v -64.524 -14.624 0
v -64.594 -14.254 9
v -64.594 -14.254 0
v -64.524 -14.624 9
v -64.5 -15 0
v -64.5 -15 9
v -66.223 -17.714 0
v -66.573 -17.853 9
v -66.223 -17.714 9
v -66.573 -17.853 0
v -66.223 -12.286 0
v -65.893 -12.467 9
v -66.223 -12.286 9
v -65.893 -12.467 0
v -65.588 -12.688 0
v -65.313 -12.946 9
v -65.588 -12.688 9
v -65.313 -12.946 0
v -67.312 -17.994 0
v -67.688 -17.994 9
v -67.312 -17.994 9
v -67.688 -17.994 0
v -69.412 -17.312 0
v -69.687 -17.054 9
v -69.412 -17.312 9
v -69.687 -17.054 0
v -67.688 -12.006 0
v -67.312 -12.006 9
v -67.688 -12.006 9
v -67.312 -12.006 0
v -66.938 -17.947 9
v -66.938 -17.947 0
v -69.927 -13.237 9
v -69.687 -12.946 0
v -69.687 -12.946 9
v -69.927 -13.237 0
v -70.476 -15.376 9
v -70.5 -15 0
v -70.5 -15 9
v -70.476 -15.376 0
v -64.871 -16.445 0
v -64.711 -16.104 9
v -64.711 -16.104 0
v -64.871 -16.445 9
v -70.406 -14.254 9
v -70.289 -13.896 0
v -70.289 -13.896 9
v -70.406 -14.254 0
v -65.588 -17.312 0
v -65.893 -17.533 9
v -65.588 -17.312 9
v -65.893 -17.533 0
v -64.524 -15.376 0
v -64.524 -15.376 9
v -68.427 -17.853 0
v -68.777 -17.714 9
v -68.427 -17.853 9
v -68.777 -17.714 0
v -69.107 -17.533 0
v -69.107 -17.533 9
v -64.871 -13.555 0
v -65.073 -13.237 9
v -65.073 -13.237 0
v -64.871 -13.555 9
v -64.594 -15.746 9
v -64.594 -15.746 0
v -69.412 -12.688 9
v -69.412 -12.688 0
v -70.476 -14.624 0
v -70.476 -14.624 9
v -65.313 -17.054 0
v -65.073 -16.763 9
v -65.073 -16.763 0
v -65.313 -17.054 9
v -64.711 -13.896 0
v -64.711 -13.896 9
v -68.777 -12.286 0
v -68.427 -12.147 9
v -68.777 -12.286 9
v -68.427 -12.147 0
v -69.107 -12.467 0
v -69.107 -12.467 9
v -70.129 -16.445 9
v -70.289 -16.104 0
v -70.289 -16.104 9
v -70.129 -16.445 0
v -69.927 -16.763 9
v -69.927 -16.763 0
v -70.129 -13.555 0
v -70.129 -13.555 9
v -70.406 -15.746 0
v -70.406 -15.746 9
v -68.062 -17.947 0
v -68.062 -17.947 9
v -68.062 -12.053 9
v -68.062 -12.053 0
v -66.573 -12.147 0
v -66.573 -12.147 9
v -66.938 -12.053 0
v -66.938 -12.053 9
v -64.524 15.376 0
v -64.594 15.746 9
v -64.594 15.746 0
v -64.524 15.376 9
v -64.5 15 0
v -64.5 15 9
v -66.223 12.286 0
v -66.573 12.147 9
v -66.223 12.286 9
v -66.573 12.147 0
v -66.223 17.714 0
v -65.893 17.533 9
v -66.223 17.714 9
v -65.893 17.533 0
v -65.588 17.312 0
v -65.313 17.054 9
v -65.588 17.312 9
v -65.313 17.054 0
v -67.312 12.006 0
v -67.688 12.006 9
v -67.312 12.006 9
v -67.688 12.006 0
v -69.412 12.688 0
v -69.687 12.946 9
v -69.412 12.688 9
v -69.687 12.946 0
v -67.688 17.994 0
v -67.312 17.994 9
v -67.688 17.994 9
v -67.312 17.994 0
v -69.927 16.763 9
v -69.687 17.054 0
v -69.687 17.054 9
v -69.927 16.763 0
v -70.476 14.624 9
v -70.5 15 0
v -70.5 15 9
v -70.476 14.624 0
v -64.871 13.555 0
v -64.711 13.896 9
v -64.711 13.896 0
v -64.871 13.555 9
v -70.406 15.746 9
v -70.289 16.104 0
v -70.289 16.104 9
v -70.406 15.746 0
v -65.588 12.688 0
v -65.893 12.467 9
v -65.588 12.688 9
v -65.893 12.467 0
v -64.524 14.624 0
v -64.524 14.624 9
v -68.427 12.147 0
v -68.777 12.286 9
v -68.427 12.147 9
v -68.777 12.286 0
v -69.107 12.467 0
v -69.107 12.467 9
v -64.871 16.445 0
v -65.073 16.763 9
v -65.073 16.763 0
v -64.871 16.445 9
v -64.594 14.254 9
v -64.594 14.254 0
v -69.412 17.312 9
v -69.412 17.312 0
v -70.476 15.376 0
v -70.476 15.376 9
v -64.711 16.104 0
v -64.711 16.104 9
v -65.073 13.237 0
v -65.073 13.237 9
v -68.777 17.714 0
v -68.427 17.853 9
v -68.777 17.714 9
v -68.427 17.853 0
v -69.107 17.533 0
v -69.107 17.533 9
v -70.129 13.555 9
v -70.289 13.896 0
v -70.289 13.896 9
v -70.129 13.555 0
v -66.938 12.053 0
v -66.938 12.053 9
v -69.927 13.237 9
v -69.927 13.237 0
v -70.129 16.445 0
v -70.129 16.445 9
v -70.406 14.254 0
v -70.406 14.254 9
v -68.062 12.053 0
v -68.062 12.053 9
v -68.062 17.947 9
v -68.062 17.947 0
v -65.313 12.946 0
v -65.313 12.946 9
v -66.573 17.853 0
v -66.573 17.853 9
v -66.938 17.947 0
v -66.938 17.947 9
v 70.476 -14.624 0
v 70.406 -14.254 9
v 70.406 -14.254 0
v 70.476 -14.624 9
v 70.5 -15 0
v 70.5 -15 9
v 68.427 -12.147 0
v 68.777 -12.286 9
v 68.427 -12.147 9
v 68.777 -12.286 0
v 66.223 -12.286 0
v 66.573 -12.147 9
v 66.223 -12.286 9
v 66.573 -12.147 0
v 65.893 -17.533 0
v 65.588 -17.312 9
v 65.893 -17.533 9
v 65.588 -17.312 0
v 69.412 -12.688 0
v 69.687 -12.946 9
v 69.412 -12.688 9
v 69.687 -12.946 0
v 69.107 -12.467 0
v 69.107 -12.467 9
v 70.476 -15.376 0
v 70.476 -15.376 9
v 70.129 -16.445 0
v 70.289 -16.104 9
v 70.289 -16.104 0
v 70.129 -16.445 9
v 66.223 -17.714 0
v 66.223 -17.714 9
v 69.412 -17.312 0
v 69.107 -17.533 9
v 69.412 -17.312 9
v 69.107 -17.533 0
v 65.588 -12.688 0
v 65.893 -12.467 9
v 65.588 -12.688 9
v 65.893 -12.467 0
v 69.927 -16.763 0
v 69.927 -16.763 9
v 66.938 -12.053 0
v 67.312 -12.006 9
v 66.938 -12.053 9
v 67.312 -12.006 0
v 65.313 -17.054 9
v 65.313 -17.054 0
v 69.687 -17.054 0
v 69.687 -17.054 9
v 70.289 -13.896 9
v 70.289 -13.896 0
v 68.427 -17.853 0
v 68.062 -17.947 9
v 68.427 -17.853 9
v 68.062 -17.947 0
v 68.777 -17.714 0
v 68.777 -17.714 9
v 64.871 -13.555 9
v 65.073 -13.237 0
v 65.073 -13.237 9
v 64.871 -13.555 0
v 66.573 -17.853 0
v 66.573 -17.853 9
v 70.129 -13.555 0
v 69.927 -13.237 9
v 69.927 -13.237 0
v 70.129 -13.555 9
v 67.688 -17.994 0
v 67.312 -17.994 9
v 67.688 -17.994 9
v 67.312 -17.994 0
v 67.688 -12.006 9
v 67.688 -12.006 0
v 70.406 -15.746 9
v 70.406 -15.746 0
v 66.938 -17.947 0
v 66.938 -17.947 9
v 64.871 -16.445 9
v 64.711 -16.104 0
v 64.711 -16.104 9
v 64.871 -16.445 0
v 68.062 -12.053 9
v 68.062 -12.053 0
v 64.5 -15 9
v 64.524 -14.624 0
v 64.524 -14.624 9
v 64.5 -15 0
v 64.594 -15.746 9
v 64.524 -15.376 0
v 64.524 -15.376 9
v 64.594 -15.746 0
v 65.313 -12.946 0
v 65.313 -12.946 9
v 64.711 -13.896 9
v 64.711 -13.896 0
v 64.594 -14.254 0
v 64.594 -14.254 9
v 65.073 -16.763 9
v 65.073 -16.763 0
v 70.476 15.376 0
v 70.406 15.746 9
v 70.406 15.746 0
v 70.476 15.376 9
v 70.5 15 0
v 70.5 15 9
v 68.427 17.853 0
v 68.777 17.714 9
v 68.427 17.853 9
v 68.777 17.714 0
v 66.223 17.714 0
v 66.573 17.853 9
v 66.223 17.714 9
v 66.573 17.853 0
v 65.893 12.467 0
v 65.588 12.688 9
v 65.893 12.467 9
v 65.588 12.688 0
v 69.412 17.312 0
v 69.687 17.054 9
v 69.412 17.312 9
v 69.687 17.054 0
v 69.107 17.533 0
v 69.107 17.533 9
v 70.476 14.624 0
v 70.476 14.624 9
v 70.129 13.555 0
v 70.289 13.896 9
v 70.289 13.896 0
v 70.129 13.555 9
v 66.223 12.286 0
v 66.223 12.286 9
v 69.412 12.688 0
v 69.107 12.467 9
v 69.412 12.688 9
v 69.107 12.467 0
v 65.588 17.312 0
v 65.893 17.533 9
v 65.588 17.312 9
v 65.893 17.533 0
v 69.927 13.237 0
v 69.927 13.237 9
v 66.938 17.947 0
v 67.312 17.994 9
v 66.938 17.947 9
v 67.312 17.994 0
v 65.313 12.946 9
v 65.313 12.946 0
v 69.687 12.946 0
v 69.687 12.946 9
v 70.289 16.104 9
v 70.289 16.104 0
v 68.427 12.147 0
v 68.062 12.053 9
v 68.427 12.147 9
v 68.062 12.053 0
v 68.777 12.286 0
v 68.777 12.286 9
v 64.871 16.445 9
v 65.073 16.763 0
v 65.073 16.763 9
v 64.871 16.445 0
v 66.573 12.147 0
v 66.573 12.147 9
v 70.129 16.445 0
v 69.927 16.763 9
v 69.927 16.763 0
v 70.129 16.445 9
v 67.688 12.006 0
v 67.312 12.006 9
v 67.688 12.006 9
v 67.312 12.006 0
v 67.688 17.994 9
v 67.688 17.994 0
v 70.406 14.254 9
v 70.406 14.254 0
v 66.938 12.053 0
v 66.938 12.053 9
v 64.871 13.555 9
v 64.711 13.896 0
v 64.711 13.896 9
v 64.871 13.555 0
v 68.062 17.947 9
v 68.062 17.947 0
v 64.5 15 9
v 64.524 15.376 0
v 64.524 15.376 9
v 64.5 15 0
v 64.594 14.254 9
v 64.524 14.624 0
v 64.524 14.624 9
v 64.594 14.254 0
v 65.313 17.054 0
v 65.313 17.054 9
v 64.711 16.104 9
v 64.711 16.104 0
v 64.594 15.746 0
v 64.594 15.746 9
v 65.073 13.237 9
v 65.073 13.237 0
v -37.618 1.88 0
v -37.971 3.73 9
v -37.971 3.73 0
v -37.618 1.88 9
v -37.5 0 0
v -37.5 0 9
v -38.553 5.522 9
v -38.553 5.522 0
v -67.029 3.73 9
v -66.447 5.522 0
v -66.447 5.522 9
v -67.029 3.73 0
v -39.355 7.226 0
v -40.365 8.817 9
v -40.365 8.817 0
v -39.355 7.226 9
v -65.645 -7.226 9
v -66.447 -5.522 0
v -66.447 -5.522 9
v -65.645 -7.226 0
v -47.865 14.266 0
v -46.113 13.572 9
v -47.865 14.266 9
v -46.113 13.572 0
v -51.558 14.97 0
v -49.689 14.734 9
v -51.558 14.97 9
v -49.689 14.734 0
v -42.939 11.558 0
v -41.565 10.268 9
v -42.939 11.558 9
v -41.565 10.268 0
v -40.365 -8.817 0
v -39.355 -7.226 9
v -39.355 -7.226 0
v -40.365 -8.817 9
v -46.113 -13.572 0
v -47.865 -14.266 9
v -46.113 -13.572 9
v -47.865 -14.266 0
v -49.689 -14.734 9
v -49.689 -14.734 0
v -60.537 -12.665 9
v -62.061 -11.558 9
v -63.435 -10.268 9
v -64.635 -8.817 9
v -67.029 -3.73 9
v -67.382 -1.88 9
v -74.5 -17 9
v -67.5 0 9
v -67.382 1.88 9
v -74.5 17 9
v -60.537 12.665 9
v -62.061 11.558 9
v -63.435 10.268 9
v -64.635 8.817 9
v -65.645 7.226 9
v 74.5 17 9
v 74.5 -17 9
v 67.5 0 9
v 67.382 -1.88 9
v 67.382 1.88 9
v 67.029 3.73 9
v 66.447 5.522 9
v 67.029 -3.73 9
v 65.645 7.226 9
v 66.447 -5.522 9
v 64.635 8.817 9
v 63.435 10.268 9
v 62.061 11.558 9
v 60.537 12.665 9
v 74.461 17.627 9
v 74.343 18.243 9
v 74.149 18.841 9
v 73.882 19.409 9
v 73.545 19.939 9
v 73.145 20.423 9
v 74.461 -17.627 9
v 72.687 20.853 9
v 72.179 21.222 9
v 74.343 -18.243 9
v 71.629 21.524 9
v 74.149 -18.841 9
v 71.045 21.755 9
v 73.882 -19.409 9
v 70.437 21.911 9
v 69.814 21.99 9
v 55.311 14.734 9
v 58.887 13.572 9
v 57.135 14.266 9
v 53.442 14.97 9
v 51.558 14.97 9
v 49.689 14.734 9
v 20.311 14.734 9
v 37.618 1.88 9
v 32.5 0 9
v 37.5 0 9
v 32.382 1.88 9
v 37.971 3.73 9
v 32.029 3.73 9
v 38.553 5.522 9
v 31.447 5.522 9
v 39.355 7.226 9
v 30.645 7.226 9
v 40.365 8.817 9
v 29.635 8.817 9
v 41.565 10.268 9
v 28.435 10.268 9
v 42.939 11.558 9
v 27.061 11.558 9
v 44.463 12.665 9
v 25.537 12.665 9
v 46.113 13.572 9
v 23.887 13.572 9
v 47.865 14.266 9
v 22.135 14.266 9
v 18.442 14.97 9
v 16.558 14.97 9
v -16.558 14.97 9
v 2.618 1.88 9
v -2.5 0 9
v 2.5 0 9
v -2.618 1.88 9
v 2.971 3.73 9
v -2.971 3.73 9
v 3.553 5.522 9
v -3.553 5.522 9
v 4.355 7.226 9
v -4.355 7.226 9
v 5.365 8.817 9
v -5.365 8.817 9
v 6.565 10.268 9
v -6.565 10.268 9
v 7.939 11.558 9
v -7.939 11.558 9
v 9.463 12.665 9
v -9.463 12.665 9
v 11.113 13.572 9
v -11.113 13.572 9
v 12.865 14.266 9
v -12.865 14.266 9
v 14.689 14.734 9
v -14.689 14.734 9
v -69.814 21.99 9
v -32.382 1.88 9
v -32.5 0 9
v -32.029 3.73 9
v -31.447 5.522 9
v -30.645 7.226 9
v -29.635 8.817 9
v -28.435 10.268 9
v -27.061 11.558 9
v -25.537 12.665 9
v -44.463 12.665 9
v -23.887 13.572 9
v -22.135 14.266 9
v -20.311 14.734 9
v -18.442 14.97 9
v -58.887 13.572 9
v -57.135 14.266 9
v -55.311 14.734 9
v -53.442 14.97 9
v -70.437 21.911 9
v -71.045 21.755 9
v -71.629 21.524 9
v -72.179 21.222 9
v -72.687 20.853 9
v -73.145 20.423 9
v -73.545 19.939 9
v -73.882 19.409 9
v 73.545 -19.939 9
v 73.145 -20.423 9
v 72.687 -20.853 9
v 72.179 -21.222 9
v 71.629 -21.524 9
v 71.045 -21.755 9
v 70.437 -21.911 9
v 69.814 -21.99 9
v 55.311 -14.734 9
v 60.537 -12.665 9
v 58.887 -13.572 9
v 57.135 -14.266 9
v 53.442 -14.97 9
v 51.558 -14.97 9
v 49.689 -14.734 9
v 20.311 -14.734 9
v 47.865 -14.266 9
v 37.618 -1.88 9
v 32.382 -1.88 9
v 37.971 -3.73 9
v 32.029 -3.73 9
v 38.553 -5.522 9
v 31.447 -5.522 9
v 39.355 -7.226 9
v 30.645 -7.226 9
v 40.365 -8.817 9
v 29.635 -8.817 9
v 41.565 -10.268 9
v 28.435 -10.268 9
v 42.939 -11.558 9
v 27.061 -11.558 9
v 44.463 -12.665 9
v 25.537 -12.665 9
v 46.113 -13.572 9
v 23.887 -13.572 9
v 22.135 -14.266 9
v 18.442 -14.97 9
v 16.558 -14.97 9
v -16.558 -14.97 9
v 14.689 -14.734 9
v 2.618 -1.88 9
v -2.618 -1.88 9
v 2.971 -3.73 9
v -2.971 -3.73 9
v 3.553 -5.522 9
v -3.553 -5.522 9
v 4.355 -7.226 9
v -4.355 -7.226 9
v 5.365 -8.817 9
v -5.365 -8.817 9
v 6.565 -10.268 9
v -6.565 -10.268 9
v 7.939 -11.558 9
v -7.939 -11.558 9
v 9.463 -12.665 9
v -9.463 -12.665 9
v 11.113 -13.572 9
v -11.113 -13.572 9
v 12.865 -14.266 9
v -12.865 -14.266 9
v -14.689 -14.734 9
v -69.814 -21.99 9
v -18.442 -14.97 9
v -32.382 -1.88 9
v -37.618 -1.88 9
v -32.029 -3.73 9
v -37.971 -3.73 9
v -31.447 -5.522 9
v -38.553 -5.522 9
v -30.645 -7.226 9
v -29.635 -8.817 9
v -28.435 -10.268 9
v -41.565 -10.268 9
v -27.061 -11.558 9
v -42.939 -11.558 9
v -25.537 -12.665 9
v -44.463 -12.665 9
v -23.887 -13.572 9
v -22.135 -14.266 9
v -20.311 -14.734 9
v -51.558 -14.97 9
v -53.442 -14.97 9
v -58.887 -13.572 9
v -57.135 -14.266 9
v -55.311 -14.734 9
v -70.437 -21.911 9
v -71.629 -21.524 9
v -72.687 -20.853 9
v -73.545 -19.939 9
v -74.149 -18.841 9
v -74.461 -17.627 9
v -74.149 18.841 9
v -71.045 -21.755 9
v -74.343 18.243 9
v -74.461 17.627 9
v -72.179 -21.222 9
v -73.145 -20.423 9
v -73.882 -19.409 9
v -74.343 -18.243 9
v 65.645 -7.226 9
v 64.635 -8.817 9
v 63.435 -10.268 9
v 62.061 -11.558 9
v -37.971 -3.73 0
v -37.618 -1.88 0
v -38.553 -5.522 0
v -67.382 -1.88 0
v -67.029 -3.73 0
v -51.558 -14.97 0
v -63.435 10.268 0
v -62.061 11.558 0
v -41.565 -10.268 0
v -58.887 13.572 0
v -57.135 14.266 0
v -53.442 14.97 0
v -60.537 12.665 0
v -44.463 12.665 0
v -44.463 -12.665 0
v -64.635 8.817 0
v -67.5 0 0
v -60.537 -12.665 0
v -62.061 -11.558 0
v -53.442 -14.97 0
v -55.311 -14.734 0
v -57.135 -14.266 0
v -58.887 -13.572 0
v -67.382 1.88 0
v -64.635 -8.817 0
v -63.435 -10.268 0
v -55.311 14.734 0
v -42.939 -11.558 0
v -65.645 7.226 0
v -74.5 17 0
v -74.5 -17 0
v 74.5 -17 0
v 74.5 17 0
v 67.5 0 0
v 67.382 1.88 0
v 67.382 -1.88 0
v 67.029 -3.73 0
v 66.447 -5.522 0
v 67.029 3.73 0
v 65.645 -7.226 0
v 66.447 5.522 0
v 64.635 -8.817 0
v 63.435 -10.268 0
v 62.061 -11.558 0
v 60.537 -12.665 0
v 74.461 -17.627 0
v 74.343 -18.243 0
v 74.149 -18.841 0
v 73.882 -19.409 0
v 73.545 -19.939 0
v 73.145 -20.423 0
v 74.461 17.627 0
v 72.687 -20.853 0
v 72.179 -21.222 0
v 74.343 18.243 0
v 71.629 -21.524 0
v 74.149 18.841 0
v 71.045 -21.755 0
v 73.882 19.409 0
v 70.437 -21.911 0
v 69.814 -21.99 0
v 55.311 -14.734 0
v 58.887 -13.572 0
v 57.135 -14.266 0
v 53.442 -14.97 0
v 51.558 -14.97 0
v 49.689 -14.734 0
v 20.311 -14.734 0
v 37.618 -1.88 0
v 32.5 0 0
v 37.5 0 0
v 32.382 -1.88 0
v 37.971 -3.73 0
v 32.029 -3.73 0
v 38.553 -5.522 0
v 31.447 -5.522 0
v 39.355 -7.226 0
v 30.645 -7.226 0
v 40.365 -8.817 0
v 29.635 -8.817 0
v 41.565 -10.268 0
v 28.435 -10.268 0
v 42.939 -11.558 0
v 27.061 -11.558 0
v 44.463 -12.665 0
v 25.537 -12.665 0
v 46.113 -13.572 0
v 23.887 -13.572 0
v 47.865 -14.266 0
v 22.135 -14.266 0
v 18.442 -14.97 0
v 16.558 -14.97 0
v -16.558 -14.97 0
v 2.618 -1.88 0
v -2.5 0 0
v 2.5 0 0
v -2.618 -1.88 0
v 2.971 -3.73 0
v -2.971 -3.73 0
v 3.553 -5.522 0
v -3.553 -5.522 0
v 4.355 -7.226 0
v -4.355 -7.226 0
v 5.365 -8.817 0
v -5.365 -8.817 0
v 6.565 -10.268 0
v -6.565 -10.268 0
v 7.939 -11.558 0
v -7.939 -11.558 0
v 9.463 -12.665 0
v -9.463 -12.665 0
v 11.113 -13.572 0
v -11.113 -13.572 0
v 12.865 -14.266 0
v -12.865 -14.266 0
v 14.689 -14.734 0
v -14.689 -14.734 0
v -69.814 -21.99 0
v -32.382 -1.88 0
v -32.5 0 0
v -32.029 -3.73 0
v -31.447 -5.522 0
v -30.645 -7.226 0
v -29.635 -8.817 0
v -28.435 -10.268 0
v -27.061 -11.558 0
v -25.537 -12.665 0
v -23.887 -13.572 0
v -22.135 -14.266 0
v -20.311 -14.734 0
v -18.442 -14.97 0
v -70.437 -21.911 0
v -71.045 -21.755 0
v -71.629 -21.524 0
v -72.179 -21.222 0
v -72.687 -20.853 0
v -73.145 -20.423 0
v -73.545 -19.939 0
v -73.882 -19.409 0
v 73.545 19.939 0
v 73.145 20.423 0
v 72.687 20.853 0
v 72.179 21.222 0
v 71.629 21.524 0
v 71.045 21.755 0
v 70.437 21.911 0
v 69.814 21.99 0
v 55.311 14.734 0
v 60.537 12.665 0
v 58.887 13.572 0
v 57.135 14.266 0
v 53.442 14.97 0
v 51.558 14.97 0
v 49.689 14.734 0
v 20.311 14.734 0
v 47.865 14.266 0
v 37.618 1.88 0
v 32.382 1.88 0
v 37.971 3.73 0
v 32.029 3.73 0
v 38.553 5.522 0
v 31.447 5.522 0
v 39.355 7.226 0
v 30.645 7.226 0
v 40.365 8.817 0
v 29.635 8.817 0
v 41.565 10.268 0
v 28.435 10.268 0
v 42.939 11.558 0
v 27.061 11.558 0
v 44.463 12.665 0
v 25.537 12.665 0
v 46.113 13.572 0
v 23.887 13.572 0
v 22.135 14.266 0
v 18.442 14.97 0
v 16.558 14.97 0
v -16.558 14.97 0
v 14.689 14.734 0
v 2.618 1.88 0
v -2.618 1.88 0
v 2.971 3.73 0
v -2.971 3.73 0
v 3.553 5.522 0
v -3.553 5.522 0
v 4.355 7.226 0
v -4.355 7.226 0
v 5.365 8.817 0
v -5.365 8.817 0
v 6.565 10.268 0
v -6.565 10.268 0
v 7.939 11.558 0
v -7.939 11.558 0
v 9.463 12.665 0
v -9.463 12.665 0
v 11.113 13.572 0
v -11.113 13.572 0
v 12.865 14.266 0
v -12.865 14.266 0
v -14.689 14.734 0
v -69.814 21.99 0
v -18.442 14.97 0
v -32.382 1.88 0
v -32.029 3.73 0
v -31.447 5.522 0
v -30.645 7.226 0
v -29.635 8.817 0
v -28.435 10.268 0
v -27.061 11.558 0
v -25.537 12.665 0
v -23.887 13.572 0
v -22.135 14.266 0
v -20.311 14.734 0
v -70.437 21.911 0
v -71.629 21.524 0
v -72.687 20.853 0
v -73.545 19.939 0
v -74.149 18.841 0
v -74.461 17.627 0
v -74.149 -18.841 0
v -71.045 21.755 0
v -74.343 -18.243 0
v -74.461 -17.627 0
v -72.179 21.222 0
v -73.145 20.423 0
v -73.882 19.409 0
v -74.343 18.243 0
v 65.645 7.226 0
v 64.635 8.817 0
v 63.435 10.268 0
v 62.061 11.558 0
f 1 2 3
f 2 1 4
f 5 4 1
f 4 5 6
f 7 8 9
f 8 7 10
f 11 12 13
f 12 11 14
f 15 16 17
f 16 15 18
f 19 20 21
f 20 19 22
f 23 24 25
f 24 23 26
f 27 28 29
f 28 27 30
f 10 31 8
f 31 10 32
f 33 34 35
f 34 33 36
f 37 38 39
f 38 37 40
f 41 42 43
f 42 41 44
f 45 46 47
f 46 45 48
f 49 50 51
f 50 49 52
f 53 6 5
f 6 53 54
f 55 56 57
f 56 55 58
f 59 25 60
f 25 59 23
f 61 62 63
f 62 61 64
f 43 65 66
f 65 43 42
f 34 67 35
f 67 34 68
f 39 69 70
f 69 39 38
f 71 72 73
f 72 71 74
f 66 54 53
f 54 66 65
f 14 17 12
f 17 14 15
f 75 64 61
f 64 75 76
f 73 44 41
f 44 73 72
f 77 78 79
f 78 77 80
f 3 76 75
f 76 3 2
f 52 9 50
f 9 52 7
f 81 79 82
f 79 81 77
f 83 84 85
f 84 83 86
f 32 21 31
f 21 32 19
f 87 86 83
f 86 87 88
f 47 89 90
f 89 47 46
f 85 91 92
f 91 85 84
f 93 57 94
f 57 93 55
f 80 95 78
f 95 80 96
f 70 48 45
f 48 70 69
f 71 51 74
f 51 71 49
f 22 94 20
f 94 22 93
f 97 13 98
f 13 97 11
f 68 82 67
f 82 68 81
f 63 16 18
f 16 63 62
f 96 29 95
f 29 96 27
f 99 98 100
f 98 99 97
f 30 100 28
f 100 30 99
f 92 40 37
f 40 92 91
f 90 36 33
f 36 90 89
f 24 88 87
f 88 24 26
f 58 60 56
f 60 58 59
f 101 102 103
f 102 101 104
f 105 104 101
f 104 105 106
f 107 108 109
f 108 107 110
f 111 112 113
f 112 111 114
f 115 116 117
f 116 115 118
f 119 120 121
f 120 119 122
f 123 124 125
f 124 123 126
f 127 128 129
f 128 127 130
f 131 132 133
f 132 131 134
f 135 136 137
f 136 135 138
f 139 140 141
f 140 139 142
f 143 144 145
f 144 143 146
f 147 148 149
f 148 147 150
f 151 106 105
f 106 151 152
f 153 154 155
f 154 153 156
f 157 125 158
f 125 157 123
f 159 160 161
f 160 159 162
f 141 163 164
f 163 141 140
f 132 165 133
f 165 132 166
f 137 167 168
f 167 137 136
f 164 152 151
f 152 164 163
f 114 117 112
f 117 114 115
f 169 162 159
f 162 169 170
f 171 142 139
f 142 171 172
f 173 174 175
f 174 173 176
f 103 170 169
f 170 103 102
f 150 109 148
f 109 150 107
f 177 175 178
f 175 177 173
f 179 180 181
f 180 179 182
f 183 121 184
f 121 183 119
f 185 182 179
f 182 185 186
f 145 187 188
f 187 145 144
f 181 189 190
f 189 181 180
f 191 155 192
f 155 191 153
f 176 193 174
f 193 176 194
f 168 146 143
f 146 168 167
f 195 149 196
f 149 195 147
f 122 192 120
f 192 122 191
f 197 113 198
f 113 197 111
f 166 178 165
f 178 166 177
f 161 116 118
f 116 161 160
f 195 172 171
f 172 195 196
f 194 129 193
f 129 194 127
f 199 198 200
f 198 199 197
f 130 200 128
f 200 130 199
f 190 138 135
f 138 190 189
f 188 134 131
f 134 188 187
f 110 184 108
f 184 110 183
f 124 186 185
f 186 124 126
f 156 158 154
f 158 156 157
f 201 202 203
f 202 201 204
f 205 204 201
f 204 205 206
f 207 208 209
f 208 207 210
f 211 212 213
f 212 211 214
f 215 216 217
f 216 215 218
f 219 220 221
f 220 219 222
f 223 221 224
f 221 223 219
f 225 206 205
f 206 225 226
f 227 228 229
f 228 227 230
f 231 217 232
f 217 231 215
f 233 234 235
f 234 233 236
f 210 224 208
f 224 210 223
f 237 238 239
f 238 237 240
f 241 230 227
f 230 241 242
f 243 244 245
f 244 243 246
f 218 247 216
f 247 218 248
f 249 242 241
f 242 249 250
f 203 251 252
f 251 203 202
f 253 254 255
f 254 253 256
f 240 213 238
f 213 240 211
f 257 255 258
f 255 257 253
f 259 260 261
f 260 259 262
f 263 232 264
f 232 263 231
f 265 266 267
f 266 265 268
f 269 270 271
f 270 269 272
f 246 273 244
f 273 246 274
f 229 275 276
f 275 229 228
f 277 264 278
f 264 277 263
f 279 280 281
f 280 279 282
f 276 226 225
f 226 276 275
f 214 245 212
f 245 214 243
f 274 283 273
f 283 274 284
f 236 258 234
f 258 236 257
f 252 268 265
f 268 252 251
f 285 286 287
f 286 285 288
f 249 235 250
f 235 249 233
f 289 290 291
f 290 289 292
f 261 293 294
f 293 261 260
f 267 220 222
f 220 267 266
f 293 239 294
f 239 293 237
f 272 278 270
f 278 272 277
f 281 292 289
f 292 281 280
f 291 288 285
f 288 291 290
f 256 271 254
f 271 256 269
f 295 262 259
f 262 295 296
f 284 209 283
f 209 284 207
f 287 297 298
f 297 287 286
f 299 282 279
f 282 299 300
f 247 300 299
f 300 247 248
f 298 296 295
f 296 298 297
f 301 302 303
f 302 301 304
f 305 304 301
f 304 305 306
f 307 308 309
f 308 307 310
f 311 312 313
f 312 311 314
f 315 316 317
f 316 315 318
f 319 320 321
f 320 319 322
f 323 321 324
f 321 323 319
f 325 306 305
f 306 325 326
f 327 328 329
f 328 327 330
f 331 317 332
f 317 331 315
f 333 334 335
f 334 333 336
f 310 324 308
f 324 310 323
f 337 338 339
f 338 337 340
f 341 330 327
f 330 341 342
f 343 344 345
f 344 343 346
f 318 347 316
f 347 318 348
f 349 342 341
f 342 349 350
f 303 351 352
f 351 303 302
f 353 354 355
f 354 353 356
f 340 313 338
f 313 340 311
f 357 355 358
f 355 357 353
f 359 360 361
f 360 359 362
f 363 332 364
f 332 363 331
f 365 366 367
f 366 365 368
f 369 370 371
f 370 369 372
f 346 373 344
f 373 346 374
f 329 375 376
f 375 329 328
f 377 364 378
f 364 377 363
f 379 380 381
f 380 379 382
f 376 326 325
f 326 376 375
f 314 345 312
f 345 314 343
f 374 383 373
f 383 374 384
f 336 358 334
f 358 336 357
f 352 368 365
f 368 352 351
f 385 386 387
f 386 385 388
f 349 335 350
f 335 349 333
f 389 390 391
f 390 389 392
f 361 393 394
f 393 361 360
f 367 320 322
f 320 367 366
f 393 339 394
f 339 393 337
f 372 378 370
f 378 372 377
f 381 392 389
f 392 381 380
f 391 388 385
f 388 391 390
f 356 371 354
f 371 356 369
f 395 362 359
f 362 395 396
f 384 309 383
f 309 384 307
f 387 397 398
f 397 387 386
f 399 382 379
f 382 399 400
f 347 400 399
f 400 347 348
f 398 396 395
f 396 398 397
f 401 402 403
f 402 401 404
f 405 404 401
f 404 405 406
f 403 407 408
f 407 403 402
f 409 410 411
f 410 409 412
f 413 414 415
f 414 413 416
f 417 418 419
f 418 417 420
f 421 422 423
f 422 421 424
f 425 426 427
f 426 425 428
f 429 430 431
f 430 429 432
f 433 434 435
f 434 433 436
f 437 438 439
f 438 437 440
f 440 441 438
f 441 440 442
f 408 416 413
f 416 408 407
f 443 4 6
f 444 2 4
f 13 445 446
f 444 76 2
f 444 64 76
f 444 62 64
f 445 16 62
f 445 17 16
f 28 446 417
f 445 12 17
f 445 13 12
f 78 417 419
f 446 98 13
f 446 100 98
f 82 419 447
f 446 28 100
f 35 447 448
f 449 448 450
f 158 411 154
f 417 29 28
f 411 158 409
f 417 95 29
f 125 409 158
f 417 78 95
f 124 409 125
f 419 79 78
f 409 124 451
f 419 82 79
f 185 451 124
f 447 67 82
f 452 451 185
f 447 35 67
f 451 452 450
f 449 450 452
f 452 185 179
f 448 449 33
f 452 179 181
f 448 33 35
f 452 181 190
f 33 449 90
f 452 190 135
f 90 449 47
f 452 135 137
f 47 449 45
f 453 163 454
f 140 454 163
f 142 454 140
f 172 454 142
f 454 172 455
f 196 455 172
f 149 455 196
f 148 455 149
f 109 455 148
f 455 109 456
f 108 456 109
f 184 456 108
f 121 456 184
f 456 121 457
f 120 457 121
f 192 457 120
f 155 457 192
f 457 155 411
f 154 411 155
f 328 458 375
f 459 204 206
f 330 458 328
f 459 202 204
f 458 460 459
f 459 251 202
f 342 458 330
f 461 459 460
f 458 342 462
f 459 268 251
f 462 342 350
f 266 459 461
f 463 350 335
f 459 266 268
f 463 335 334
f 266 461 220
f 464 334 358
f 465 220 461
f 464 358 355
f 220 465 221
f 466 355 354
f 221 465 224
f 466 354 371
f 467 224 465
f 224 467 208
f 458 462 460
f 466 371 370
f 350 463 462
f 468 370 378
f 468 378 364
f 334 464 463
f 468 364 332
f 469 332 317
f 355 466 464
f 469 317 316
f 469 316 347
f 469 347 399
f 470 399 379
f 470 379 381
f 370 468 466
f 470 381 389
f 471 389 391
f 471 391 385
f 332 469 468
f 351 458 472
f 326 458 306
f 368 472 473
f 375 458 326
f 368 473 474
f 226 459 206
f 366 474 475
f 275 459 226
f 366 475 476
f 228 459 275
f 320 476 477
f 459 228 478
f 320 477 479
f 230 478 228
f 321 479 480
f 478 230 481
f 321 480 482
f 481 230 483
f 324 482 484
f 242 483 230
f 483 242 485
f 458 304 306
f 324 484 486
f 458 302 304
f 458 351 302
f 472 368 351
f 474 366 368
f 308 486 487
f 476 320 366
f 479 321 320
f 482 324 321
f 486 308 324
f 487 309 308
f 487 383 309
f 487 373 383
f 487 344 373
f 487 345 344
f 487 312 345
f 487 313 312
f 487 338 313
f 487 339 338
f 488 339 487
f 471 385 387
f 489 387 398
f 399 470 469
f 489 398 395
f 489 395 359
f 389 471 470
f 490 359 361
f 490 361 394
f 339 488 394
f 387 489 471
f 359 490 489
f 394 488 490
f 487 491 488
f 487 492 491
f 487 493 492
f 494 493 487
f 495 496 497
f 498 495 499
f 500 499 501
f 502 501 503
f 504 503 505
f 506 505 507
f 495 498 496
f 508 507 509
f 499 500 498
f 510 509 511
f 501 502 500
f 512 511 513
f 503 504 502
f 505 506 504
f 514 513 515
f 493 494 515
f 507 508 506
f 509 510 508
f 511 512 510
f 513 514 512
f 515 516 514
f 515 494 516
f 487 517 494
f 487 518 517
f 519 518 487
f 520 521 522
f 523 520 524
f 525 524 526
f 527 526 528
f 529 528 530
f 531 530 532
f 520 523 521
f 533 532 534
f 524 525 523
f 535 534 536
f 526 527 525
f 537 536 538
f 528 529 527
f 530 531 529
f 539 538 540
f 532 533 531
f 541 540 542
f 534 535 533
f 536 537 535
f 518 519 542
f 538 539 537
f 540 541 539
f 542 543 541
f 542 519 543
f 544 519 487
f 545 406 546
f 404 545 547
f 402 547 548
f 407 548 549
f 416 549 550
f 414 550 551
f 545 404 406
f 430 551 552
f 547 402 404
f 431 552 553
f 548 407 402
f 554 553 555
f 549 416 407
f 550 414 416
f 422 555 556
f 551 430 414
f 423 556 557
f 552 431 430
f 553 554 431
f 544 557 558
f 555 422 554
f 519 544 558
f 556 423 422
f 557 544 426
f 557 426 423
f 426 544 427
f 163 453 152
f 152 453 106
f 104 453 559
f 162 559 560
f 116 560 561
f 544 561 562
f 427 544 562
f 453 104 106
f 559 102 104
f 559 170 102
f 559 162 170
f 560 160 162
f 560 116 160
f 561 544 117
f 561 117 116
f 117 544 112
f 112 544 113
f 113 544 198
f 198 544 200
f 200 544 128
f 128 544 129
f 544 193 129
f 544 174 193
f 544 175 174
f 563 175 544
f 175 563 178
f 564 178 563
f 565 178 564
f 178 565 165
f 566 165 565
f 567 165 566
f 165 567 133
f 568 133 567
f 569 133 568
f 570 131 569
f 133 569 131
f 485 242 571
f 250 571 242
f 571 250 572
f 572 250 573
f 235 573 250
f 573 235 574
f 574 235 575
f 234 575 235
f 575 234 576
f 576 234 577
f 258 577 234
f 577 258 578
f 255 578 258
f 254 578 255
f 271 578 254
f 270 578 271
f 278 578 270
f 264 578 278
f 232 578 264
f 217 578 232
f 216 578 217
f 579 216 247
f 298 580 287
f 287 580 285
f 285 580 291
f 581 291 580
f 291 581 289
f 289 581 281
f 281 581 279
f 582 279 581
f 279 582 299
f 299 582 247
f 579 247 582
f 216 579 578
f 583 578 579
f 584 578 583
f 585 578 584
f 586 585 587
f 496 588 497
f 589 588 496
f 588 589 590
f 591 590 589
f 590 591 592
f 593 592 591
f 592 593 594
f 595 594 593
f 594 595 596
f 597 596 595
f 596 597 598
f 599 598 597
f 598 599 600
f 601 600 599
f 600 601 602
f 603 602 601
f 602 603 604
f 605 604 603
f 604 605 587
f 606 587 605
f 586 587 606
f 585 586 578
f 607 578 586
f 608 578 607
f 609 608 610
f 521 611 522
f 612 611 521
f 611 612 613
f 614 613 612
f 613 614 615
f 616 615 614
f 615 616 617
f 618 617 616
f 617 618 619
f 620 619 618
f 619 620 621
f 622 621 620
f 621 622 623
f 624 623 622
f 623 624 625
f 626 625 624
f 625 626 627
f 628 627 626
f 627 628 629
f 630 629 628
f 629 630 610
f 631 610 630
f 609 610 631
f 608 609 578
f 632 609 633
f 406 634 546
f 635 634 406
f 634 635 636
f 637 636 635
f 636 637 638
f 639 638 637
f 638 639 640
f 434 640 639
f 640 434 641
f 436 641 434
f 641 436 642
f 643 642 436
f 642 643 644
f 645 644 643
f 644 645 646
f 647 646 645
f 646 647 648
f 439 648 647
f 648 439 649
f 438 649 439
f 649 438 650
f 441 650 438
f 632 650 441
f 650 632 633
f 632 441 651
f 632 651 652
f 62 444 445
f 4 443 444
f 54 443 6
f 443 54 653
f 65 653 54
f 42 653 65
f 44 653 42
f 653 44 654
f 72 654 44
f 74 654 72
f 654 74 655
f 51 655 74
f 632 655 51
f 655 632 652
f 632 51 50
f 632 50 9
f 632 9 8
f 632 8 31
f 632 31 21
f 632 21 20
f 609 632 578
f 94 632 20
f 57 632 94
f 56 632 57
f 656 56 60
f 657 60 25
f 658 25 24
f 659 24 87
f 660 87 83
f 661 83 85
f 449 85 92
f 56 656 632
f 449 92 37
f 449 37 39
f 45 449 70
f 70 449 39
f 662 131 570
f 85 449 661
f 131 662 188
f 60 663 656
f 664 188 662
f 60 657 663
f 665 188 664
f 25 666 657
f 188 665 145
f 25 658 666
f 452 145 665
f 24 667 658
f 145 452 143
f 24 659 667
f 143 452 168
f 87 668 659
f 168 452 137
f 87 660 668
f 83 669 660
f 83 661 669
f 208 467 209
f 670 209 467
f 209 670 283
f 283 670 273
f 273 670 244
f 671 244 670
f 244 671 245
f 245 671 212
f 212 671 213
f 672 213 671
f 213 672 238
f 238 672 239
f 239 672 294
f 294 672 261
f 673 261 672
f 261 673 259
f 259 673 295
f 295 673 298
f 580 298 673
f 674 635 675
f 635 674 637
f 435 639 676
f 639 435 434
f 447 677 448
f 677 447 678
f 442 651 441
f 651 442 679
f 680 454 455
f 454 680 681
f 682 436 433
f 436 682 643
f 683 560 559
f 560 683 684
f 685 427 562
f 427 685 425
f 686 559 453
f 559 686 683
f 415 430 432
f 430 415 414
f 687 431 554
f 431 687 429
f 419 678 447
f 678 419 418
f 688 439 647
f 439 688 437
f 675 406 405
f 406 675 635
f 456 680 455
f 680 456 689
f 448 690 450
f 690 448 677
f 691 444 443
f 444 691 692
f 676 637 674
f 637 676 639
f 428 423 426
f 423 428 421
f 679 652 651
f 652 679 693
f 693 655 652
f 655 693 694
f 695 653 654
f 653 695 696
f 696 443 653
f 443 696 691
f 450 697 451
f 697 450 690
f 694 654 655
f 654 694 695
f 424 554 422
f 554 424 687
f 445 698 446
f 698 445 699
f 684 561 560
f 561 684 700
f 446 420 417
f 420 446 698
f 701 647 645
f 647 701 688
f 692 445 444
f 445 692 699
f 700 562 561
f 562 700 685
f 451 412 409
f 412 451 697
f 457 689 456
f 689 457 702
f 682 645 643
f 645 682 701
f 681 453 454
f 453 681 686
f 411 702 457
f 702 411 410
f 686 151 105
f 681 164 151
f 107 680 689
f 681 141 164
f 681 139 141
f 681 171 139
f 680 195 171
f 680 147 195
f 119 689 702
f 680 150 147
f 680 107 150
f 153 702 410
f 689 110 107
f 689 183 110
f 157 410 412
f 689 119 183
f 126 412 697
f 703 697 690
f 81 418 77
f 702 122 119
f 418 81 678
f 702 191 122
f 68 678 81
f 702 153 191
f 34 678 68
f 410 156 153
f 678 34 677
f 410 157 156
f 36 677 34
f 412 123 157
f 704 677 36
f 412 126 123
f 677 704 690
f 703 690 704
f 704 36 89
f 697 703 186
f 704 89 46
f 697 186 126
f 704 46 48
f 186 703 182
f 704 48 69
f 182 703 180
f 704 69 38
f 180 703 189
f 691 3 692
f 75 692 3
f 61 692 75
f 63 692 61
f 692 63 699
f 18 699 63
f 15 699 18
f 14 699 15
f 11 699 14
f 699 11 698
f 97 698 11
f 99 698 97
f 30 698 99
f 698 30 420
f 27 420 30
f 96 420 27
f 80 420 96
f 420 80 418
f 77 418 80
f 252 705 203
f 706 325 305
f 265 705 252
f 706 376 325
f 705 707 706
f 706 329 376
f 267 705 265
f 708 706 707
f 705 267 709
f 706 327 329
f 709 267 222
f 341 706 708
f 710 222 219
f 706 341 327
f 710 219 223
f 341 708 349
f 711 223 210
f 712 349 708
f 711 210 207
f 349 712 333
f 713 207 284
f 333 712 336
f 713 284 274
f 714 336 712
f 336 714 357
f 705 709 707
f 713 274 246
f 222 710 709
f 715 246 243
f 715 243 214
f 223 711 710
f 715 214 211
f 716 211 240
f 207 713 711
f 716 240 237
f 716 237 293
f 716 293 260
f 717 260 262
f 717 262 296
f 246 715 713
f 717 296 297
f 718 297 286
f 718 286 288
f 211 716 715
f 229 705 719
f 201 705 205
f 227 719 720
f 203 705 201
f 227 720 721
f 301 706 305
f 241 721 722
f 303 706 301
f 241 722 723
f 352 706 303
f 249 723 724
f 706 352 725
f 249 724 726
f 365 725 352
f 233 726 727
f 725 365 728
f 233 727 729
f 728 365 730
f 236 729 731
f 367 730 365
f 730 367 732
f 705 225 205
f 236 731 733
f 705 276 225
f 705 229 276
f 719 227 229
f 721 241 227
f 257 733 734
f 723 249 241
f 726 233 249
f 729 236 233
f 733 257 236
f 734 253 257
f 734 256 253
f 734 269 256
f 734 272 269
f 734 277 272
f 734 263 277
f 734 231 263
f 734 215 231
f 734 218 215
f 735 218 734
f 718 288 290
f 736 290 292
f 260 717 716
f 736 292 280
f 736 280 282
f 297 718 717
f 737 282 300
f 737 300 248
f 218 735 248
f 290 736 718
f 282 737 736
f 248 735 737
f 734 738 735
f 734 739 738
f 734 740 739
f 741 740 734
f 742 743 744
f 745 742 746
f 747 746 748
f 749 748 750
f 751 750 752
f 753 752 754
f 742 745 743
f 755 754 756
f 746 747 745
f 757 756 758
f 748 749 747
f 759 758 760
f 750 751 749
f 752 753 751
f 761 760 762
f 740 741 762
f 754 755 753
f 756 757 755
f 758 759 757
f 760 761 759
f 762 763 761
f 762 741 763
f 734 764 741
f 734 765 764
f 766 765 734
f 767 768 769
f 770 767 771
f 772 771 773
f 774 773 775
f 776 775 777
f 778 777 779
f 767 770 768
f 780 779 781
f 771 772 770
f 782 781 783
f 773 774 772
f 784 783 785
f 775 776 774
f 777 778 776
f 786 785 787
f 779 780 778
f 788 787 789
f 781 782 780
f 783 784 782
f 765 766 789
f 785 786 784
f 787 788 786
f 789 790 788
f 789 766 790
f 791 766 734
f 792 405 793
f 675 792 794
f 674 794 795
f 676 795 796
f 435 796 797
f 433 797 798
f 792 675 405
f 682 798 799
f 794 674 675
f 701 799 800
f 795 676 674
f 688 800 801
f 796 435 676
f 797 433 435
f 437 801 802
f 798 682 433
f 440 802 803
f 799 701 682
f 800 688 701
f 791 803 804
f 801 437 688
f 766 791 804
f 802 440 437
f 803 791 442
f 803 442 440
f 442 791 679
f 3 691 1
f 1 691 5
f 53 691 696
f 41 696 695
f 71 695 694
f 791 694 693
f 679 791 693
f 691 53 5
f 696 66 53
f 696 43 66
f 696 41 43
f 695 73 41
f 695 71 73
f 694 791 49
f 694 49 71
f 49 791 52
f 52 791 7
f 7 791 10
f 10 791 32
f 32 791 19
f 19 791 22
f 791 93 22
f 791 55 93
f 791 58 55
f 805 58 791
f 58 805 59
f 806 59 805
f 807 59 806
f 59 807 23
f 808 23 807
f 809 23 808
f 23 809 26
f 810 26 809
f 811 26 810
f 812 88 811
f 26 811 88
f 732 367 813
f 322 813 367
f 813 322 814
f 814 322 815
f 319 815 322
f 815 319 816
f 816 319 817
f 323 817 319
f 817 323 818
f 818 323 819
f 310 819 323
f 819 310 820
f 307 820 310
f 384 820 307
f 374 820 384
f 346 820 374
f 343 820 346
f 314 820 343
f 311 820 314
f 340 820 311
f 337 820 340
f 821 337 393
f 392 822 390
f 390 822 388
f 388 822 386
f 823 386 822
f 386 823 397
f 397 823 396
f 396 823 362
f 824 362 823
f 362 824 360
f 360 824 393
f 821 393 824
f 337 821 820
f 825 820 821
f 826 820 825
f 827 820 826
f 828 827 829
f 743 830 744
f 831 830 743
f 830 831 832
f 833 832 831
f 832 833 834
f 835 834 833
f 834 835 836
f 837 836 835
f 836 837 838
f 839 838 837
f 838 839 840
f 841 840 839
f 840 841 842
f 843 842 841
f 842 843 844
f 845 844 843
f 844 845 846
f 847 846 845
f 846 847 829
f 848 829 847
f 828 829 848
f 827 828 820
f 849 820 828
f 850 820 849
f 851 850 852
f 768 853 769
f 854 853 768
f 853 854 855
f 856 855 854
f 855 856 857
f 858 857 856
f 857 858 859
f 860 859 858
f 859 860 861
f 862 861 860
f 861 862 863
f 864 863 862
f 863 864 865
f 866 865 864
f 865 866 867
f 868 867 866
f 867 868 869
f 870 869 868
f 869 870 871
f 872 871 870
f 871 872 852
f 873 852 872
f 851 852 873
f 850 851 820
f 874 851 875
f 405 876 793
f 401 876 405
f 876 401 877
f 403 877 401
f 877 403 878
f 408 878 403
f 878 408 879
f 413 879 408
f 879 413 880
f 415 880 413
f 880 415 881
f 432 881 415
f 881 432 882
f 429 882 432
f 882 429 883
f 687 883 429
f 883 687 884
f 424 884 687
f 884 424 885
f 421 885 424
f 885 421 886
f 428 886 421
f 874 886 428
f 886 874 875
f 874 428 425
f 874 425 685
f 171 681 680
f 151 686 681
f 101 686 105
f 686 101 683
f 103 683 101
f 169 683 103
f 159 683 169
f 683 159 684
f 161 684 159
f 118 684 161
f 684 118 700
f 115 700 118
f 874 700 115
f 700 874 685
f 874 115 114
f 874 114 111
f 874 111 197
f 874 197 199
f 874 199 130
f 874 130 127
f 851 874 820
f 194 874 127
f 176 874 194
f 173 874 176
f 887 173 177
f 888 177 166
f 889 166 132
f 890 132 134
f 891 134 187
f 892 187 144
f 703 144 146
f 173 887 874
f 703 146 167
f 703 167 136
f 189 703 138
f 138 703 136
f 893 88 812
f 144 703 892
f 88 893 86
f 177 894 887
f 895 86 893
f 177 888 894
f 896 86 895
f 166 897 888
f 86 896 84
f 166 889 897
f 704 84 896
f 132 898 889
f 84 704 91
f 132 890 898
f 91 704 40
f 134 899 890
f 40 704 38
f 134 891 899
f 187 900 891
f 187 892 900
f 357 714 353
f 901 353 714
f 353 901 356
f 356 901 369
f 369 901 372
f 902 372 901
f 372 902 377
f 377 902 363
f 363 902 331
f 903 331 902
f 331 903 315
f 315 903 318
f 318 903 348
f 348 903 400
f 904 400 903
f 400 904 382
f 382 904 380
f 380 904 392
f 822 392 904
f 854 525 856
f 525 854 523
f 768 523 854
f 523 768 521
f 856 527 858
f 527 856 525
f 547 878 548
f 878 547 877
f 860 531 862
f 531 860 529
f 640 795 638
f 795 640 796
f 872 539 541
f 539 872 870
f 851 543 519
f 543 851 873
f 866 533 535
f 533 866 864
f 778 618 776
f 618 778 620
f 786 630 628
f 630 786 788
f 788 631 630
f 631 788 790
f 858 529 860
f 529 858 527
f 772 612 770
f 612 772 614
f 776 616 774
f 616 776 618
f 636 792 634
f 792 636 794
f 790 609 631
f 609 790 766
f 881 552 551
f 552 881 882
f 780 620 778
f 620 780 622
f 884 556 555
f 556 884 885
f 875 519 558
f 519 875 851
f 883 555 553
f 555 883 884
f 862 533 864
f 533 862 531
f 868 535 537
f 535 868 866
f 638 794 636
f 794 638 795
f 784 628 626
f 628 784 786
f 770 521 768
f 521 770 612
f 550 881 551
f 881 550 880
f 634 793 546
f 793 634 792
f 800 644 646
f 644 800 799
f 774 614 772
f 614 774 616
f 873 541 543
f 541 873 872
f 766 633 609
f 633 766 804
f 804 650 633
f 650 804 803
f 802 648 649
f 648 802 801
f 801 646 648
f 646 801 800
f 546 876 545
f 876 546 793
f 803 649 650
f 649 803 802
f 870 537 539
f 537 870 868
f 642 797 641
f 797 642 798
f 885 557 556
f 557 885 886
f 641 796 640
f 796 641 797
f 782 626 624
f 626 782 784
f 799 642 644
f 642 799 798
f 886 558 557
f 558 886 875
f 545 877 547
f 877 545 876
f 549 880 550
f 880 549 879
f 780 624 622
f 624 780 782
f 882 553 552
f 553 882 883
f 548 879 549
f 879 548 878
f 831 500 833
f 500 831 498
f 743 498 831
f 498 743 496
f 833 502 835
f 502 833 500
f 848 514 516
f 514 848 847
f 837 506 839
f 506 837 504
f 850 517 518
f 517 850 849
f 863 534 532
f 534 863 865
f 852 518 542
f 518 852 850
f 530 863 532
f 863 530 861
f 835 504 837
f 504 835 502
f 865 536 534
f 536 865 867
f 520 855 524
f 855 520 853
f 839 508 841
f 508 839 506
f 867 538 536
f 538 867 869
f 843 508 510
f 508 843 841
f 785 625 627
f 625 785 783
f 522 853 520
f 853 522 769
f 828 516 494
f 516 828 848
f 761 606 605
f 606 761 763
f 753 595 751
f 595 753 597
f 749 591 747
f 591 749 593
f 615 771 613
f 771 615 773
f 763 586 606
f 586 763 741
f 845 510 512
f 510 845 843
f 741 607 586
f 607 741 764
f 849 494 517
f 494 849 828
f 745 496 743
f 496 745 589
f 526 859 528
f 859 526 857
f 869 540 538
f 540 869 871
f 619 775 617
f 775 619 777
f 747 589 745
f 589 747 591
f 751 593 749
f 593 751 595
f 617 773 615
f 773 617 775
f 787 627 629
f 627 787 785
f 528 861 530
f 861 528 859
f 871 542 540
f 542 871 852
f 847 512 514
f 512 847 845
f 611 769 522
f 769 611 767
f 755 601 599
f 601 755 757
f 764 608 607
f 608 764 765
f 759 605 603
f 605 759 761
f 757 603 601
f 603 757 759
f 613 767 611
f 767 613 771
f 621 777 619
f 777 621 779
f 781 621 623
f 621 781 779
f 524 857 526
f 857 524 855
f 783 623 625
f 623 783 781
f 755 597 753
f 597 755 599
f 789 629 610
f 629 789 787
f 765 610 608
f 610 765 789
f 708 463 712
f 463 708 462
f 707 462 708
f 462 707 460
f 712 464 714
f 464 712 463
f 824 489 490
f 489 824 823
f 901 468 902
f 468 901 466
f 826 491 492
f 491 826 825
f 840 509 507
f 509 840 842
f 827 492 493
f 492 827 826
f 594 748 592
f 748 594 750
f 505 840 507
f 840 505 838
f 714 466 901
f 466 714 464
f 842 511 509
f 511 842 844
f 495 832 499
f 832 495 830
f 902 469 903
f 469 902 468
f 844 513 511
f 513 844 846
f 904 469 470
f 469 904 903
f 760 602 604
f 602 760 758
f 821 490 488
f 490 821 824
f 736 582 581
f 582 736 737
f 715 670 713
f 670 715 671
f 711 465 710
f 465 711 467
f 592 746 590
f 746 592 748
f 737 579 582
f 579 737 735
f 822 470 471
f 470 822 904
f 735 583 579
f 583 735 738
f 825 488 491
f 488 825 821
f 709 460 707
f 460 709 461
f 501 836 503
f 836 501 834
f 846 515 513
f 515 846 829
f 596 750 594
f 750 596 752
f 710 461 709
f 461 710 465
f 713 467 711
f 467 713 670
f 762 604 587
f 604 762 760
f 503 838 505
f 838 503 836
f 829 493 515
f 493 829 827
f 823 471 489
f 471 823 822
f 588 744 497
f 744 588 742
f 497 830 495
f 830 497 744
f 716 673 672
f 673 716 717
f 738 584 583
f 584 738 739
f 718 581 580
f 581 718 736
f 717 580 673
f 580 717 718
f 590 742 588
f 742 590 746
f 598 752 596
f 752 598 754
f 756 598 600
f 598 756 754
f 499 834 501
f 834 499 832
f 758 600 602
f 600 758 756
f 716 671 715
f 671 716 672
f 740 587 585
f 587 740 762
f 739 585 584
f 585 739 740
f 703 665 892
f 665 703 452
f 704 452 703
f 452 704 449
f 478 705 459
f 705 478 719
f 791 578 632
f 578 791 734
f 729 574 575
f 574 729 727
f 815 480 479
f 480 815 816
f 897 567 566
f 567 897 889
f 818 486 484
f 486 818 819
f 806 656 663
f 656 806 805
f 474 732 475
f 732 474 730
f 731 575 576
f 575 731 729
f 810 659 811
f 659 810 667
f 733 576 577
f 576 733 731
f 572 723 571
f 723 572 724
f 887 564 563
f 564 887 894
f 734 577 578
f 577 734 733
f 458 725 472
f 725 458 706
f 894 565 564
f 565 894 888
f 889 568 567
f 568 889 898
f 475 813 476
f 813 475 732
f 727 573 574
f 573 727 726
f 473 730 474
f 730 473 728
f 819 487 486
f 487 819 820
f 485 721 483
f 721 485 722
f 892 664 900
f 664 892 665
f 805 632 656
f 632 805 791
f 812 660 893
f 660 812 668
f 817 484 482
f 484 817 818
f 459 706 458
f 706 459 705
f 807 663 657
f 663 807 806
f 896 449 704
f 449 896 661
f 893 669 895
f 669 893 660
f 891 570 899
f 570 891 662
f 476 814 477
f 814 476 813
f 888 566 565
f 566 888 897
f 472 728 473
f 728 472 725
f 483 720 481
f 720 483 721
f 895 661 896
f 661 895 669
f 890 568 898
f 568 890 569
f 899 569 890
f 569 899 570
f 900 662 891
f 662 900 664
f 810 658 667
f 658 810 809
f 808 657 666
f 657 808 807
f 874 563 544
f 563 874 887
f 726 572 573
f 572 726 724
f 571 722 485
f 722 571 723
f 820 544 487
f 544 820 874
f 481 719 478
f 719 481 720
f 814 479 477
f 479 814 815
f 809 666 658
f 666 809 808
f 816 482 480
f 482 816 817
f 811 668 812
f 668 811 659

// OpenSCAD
$fn = 50;

difference() {
	union() {
		hull() {
			translate(v = [-69.5, 17.0, 0]) {
				cylinder(h = 9, r = 5);
			}
			translate(v = [69.5, 17.0, 0]) {
				cylinder(h = 9, r = 5);
			}
			translate(v = [-69.5, -17.0, 0]) {
				cylinder(h = 9, r = 5);
			}
			translate(v = [69.5, -17.0, 0]) {
				cylinder(h = 9, r = 5);
			}
		}
	}
	union() {
		translate(v = [-67.5, -15.0, -100.0]) {
			cylinder(h = 200, r = 3.0);
		}
		translate(v = [-67.5, 15.0, -100.0]) {
			cylinder(h = 200, r = 3.0);
		}
		translate(v = [67.5, -15.0, -100.0]) {
			cylinder(h = 200, r = 3.0);
		}
		translate(v = [67.5, 15.0, -100.0]) {
			cylinder(h = 200, r = 3.0);
		}
		translate(v = [-67.5, -15.0, -100.0]) {
			cylinder(h = 200, r = 1.5);
		}
		translate(v = [-67.5, 15.0, -100.0]) {
			cylinder(h = 200, r = 1.5);
		}
		translate(v = [67.5, -15.0, -100.0]) {
			cylinder(h = 200, r = 1.5);
		}
		translate(v = [67.5, 15.0, -100.0]) {
			cylinder(h = 200, r = 1.5);
		}
		translate(v = [-52.5, 0, 0.0]) {
			cylinder(h = 9, r = 15.0);
		}
		translate(v = [-17.5, 0, 0.0]) {
			cylinder(h = 9, r = 15.0);
		}
		translate(v = [17.5, 0, 0.0]) {
			cylinder(h = 9, r = 15.0);
		}
		translate(v = [52.5, 0, 0.0]) {
			cylinder(h = 9, r = 15.0);
		}
	}
}
